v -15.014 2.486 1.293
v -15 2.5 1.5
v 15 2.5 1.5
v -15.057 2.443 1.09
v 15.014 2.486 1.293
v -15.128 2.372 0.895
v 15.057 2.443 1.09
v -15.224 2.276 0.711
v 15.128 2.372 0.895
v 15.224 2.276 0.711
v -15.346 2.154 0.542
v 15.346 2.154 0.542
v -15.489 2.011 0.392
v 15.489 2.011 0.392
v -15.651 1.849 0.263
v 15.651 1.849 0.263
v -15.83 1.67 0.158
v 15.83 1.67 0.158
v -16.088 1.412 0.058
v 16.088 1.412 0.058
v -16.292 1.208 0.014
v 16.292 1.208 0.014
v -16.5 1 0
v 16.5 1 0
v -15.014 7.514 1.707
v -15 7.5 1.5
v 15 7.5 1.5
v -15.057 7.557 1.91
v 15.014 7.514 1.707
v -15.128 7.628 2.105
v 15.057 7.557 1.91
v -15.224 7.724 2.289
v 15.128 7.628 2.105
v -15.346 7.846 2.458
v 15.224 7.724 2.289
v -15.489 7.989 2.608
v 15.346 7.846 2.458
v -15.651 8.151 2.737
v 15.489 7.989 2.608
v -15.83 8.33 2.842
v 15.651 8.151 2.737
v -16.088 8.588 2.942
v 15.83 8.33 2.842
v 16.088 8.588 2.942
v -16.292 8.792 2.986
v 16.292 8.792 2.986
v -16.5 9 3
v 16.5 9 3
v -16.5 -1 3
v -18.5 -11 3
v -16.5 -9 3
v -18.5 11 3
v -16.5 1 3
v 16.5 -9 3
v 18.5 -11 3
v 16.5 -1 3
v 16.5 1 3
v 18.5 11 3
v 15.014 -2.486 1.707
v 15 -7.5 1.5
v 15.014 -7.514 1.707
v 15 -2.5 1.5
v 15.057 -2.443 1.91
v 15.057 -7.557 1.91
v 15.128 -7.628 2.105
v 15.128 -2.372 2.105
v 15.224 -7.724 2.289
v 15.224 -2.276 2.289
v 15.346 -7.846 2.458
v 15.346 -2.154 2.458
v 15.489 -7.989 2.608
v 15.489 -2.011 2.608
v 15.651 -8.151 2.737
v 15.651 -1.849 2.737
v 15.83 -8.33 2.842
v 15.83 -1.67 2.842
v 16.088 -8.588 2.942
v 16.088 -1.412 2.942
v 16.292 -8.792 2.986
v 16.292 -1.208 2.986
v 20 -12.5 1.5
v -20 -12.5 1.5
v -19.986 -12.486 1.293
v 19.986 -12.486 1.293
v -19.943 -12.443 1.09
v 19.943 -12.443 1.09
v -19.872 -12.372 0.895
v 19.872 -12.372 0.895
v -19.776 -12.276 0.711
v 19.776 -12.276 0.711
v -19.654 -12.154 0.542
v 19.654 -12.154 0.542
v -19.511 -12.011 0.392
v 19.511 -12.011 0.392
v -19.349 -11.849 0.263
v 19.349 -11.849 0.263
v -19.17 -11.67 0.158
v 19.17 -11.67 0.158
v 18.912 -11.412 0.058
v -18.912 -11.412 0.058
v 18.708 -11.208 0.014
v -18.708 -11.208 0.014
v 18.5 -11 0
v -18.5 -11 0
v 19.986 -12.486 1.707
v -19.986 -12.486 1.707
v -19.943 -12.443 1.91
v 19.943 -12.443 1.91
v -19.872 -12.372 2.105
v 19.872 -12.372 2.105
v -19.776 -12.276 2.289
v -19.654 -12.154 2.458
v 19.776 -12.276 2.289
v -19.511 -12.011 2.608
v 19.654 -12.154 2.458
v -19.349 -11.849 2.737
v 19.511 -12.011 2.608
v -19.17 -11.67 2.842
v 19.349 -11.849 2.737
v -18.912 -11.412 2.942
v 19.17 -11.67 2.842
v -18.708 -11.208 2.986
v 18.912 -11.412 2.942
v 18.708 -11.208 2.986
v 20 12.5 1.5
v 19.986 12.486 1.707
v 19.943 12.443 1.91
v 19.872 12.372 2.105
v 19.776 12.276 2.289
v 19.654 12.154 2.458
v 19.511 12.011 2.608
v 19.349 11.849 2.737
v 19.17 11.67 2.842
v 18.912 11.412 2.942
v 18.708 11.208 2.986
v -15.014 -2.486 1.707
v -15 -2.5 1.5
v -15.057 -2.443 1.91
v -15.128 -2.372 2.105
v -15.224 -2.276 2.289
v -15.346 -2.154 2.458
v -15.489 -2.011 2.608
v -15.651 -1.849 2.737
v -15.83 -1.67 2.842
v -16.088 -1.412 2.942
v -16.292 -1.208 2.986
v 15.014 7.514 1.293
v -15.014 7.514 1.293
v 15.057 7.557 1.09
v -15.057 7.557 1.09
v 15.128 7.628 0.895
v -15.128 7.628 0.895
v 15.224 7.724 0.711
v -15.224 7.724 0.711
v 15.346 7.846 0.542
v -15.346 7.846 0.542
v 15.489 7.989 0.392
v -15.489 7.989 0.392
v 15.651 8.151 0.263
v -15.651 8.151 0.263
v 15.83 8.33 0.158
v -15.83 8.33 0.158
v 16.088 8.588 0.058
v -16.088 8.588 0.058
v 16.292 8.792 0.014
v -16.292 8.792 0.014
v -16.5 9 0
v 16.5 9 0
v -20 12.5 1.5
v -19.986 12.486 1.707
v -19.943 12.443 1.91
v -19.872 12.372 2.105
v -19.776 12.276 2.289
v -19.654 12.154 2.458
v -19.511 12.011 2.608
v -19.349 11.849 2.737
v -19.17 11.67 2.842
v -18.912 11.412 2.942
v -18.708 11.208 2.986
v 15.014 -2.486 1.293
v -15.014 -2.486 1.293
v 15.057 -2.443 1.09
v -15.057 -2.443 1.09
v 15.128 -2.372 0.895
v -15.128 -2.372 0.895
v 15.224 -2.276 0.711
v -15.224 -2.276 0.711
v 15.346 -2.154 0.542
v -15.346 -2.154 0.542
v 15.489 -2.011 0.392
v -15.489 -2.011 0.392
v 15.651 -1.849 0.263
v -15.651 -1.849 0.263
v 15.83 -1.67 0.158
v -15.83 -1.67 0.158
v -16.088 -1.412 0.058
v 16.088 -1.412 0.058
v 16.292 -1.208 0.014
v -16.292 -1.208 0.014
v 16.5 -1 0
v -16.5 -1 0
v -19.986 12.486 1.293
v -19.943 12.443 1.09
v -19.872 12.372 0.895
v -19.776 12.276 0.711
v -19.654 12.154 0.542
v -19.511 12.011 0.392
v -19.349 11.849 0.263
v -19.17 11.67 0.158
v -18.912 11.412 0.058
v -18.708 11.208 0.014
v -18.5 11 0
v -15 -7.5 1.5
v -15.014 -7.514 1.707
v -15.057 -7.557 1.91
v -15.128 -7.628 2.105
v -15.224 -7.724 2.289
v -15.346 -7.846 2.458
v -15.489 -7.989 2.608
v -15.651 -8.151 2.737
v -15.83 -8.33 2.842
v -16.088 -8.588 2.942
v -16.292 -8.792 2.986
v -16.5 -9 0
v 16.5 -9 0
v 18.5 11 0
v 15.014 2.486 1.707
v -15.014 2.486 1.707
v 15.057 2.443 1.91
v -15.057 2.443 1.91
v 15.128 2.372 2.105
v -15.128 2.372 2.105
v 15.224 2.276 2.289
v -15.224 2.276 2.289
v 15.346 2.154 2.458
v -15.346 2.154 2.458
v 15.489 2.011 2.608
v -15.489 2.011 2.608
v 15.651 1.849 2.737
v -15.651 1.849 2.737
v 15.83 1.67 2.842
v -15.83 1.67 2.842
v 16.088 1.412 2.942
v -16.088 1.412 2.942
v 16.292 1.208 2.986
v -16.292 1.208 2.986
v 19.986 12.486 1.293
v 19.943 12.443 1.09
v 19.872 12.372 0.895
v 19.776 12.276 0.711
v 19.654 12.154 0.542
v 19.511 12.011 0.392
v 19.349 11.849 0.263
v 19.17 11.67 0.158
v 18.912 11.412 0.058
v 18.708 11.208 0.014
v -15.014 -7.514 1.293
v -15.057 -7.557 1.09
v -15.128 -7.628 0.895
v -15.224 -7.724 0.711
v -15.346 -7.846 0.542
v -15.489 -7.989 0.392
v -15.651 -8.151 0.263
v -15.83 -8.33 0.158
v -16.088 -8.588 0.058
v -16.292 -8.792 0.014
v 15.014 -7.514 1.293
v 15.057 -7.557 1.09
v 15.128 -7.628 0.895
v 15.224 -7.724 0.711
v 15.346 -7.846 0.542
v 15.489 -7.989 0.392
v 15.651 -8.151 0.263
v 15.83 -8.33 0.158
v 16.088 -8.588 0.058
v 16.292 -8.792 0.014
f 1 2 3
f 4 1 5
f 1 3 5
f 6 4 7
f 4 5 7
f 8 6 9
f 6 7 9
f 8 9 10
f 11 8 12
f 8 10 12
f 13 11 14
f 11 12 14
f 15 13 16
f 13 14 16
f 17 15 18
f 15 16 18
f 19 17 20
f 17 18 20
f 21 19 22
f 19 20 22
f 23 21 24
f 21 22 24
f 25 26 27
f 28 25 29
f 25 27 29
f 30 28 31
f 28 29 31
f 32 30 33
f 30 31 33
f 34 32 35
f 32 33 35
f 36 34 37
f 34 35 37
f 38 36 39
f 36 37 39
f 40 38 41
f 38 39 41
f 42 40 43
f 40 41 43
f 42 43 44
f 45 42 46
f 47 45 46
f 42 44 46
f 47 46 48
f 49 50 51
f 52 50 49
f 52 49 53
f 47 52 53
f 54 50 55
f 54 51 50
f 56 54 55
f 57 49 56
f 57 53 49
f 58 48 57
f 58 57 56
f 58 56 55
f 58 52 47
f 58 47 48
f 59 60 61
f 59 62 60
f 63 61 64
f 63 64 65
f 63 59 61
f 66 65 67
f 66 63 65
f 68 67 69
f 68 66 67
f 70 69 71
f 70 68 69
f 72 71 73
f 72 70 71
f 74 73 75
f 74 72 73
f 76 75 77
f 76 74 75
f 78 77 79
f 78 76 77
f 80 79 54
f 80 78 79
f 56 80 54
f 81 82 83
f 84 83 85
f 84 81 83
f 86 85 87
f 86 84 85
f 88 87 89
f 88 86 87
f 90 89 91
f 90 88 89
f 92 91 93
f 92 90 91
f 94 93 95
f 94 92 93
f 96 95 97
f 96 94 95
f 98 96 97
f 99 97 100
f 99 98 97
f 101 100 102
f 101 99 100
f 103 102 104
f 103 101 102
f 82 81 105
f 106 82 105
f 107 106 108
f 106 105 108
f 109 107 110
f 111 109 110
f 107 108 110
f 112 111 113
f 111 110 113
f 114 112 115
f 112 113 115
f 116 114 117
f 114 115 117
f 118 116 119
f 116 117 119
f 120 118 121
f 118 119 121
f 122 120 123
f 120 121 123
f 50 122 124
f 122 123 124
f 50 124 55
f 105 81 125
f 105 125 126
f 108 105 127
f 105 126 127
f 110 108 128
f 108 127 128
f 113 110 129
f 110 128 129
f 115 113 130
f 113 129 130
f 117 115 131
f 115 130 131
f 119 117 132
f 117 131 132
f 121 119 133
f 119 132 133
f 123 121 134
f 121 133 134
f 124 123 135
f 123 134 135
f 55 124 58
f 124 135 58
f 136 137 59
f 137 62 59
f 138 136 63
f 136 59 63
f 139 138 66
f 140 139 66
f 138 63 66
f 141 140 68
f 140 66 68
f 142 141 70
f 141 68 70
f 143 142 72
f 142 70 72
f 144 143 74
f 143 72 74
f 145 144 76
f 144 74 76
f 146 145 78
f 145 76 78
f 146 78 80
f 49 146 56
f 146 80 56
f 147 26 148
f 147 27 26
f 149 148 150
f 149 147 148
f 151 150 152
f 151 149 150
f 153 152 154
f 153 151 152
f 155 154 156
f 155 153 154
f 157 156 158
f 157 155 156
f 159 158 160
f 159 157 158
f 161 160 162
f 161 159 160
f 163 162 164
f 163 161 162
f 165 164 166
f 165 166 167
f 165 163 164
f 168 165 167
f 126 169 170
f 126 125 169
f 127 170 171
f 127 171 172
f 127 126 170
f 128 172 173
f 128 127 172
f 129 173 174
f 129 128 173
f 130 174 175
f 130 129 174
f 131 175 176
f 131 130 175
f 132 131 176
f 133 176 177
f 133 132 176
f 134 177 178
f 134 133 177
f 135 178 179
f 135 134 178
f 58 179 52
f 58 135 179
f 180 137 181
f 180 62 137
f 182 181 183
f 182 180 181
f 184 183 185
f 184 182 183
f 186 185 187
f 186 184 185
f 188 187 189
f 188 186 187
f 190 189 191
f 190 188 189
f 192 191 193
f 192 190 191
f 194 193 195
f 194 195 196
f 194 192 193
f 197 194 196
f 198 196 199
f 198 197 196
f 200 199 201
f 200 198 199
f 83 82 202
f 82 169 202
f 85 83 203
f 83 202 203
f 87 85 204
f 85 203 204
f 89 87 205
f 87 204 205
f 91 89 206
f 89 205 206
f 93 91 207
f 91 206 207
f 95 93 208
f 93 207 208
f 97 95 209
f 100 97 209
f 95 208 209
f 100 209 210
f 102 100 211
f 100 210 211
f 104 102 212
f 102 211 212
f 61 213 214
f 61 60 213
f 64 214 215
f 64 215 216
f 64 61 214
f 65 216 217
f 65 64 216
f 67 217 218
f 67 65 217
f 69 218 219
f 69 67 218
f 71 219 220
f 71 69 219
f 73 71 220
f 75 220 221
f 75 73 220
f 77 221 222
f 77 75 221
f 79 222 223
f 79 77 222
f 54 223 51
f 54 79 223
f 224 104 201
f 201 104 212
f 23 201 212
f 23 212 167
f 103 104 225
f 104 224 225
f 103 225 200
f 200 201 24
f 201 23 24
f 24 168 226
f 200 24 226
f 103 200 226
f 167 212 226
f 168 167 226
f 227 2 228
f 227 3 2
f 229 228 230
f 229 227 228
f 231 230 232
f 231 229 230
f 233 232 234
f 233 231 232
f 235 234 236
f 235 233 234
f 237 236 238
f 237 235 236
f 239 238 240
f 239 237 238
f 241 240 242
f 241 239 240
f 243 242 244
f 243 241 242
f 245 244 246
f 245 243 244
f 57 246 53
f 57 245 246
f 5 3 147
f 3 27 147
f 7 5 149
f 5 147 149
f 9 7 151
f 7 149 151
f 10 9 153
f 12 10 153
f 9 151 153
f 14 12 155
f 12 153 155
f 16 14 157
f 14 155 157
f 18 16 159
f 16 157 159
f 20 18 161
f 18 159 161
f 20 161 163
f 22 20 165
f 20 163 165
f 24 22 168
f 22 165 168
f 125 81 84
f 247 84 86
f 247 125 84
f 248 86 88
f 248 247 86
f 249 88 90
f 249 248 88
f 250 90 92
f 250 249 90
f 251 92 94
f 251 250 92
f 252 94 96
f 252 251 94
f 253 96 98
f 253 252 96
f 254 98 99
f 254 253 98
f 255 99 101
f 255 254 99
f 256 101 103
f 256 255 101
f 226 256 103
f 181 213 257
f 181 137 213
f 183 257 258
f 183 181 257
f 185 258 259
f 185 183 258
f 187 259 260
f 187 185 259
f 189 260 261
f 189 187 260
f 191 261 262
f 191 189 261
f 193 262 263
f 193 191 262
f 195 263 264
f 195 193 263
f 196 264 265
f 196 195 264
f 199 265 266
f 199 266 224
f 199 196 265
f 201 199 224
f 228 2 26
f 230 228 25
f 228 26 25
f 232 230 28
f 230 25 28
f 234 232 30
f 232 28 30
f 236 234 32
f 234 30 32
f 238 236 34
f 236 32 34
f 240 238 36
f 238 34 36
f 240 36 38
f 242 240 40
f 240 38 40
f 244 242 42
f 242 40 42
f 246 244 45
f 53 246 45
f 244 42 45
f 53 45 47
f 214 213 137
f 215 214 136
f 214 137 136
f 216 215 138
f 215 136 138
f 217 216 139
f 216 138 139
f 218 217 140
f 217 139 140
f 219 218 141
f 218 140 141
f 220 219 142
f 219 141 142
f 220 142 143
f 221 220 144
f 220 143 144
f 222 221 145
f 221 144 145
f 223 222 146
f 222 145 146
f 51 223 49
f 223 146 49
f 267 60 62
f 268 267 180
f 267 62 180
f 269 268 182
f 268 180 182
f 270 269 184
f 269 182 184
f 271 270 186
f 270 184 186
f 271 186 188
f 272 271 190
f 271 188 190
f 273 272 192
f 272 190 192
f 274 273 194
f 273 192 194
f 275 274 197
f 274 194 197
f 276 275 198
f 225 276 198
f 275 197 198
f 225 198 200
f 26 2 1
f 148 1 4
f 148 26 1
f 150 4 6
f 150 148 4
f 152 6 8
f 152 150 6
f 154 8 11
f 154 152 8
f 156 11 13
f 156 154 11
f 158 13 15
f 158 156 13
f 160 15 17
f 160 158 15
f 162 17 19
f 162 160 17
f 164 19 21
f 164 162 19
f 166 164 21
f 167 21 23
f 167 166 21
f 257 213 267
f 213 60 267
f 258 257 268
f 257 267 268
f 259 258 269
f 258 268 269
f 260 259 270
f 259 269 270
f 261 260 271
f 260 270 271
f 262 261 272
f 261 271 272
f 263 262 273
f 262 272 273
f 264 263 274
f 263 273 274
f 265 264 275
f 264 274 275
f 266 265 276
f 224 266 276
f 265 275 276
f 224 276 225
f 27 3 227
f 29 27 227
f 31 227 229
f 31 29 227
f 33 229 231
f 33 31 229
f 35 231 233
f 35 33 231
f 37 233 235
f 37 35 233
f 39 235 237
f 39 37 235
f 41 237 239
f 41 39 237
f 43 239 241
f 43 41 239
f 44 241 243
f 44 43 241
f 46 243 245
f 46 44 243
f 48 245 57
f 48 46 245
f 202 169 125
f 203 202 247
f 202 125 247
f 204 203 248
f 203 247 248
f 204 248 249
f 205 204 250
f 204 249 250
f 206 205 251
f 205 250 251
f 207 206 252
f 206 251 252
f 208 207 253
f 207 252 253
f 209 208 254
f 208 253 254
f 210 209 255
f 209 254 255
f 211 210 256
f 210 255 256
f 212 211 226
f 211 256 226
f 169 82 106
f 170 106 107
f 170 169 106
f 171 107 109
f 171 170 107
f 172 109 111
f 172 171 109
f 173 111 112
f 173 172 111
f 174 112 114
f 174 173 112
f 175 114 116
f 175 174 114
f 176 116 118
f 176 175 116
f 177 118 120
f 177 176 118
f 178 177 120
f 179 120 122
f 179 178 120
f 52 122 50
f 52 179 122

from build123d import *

# Parameters (mm, degrees)
F0_W     = 40
F0_H     = 25
F0_W_2   = 30
F0_H_2   = 5
F1_DEPTH = 3
F2_R     = 1.49999


# Not quite as in the source:
# - a fillet or chamfer is up to 0.001 mm smaller than in the source, because OpenCascade refuses the exact size


with BuildPart() as f1:
    # F0 (on Top) → F1 (new body)
    with BuildSketch(Plane.XY):
        Rectangle(F0_W, F0_H)
        with Locations((0, -5)):
            Rectangle(F0_W_2, F0_H_2, mode=Mode.SUBTRACT)
        with Locations((0, 5)):
            Rectangle(F0_W_2, F0_H_2, mode=Mode.SUBTRACT)
    extrude(amount=F1_DEPTH)

    # F2 (radius 1.5 in the source; OpenCascade refuses exactly that, so slightly less here)
    f2_edges = [f1.edges().sort_by_distance(p)[0] for p in [
        (0, -12.5, 3),
        (-20, 0, 3),
        (0, 12.5, 3),
        (20, 0, 3),
        (0, -12.5, 0),
        (20, 0, 0),
        (-20, 0, 0),
        (0, 12.5, 0),
        (0, 2.5, 3),
        (0, 7.5, 3),
        (15, 5, 3),
        (15, -5, 3),
        (0, -7.5, 3),
        (0, -2.5, 3),
        (-15, -5, 3),
        (-15, 5, 3),
        (0, 2.5, 0),
        (15, 5, 0),
        (0, 7.5, 0),
        (-15, 5, 0),
        (-15, -5, 0),
        (0, -2.5, 0),
        (15, -5, 0),
        (0, -7.5, 0),
    ]]
    fillet(f2_edges, radius=F2_R)


solid = f1.part
